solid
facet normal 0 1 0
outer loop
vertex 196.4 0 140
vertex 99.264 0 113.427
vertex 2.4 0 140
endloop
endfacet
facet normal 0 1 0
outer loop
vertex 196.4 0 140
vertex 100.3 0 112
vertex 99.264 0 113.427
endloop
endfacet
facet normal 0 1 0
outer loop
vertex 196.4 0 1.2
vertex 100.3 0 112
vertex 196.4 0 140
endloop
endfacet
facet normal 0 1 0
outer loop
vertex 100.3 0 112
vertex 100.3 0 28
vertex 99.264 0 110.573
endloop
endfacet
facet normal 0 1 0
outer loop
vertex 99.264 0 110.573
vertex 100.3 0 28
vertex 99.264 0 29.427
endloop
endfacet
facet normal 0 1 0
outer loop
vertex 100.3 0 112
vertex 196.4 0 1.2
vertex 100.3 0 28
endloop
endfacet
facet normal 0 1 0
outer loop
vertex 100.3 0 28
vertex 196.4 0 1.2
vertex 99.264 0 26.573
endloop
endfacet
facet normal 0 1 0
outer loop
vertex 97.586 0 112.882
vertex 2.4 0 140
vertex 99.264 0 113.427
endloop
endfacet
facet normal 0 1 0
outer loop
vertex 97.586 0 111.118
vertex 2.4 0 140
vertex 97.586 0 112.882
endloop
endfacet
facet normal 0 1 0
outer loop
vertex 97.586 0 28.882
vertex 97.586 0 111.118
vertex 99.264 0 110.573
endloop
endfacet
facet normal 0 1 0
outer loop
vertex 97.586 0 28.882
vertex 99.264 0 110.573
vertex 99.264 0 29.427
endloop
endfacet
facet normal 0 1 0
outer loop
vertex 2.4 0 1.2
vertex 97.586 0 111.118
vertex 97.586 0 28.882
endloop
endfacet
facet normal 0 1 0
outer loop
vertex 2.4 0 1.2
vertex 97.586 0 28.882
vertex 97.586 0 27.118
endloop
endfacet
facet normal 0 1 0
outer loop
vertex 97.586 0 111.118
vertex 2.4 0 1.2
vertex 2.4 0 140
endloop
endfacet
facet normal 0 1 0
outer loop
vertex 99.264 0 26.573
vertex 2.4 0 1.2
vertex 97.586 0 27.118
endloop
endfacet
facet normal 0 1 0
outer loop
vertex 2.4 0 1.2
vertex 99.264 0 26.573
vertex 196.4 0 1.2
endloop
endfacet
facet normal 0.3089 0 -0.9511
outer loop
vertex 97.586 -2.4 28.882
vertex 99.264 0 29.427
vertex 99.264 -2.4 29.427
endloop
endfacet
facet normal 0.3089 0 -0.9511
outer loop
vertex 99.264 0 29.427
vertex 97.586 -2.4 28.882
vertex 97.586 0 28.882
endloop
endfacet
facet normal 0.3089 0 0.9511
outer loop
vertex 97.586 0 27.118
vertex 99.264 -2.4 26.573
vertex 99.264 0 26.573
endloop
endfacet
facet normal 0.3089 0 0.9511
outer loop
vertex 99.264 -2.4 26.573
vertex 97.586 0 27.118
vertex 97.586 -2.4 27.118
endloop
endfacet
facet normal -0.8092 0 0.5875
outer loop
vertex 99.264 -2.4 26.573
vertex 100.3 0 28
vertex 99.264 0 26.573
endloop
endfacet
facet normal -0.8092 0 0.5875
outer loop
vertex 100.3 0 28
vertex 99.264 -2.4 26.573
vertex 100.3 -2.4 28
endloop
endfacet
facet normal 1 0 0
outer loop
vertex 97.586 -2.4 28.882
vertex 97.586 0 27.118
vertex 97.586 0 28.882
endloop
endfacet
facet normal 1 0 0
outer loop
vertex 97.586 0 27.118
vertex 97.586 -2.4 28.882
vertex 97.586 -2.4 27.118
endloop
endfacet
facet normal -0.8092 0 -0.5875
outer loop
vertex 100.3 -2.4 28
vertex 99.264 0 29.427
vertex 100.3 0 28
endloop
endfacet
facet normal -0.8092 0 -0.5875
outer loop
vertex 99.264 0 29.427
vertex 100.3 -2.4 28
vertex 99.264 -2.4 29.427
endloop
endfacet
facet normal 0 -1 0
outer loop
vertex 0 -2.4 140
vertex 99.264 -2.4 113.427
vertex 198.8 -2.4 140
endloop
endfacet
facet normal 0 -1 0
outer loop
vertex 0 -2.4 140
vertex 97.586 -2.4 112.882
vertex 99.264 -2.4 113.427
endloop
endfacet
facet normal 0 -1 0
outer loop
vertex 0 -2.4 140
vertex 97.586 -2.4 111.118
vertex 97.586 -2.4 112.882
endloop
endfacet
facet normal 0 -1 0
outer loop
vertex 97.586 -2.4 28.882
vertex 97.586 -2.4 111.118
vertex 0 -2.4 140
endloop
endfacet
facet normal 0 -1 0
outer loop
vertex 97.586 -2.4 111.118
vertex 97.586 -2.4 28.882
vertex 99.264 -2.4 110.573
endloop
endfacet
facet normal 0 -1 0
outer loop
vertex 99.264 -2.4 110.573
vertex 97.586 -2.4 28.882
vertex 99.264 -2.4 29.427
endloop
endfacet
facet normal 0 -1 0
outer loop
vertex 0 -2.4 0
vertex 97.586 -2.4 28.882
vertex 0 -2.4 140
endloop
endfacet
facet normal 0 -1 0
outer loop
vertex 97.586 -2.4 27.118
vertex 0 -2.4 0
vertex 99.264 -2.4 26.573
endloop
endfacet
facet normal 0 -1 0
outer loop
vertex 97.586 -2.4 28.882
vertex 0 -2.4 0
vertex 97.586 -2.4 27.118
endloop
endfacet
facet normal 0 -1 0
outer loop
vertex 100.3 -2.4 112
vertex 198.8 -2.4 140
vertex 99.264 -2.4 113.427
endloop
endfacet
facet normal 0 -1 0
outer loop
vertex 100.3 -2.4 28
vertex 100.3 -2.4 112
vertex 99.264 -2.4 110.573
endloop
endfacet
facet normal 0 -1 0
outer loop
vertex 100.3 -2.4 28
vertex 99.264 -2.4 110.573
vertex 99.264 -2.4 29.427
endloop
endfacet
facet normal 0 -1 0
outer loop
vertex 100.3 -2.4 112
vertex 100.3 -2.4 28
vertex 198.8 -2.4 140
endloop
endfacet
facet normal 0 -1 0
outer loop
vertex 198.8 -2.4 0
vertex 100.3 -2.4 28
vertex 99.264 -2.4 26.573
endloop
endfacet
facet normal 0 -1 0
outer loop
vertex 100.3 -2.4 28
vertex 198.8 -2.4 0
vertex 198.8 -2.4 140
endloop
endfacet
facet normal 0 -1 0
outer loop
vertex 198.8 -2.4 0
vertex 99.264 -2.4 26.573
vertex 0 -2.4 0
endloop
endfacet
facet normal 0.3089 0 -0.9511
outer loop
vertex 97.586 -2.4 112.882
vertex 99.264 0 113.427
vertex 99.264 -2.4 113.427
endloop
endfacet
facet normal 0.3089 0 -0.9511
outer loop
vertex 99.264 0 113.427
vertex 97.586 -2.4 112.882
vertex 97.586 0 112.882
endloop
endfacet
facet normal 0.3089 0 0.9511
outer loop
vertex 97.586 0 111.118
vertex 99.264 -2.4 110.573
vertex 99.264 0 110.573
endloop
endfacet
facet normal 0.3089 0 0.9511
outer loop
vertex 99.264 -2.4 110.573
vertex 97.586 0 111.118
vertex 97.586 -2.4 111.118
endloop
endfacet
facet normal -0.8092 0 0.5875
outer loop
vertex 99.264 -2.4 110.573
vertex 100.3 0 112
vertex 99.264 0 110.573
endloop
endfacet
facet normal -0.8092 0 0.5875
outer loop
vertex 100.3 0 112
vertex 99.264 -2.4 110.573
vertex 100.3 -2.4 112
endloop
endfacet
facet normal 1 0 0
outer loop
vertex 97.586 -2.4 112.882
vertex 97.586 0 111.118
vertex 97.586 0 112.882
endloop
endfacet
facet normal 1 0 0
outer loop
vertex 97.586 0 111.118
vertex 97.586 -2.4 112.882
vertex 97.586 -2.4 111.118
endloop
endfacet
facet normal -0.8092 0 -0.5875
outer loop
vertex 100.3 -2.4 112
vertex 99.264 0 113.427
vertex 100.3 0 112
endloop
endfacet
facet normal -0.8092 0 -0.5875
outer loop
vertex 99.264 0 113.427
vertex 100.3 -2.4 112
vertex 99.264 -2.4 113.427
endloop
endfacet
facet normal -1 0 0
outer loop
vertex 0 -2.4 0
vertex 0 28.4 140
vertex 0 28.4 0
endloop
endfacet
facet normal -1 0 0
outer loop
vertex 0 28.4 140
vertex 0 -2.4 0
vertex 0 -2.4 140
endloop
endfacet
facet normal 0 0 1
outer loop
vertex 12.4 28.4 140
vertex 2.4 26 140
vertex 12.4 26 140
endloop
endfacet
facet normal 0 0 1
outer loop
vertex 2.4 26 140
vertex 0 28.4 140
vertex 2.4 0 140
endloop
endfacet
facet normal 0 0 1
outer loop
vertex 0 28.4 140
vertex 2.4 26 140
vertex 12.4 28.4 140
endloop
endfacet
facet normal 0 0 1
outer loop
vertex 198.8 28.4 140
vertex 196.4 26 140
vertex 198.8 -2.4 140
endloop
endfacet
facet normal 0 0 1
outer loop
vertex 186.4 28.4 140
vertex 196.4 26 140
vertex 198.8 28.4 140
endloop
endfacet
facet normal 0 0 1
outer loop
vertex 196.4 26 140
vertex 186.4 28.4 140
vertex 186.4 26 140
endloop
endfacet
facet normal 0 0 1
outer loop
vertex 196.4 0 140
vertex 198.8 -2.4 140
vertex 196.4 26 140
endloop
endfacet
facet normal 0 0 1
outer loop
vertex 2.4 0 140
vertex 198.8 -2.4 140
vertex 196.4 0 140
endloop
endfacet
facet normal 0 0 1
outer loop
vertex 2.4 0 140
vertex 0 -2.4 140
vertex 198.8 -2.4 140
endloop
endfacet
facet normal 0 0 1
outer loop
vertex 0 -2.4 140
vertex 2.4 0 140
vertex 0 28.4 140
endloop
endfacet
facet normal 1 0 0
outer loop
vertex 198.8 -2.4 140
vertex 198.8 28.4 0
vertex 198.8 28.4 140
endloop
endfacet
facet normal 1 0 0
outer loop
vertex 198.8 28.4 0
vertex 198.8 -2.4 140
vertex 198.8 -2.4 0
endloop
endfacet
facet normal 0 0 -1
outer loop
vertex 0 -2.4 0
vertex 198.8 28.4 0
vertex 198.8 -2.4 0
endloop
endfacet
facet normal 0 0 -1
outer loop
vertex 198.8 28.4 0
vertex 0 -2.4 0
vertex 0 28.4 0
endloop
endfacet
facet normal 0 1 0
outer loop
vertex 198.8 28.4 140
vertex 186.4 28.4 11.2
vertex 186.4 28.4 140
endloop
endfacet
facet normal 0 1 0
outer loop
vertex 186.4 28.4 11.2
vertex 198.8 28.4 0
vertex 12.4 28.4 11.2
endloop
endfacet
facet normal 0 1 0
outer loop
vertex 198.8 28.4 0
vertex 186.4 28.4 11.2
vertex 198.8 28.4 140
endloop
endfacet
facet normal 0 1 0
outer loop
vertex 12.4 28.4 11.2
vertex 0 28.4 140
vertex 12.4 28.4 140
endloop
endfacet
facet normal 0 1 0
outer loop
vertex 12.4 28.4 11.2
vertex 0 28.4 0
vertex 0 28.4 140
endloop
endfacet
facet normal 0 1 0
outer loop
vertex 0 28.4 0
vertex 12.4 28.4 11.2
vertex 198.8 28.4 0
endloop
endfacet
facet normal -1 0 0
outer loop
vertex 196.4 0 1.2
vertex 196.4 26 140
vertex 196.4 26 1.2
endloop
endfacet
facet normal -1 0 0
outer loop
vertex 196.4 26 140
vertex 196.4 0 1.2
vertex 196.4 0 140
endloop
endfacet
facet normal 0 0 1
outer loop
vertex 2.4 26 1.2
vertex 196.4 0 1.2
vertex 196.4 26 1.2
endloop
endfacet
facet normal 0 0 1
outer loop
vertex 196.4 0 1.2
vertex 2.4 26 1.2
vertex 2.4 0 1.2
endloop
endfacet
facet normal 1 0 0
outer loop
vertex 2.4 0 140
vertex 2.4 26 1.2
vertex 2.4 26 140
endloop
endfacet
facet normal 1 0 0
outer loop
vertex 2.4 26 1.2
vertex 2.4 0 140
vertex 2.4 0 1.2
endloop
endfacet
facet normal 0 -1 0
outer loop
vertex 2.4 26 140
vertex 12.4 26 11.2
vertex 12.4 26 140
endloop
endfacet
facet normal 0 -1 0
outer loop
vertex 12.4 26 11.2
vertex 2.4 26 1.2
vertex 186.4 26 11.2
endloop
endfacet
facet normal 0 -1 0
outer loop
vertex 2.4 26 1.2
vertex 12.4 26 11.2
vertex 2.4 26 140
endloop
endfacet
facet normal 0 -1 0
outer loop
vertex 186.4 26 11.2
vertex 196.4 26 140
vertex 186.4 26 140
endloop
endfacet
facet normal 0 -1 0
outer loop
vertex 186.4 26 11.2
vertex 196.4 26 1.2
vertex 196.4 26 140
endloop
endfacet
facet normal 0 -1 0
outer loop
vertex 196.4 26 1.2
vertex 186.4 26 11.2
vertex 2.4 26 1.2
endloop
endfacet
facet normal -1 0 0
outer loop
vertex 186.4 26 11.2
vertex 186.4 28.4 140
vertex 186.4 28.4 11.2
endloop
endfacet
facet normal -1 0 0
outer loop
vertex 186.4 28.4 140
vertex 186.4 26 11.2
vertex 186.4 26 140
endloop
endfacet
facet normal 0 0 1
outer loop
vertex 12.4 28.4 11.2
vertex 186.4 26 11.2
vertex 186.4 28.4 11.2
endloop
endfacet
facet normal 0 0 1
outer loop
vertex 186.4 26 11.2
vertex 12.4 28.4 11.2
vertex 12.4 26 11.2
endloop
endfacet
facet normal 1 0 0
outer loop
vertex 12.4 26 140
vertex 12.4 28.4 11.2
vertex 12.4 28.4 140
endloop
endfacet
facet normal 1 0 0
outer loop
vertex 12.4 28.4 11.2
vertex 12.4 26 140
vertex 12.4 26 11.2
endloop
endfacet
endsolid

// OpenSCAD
z = 90;

//bathroom holder
boxes = [
    [21], // marker
    [32.5], // flonaise
    [10, 36], // comb
    [55, 30], // toothpaste
    [25], // toothbrush 
    [25], // toothbrush
];

//mice
boxes = [
    [93, 17], // keyboard thing
    [62, 40], // mouse
];
z = 60;

//remotes
boxes = [
    [40, 20], // fire TV
    [61, 25], // denon
    [57, 30], // projector
];
z = 70;

x=194;
y=26;

boxes = [
    [194,26],
];
z = 140;
edge = 10;


function my_sum(i, total=0) =
    i==0 ?
        total + boxes[0][0] :
        my_sum(i - 1, total + boxes[i][0]);

module all_shapes(move=0, grow=0) {
    for (n = [0:len(boxes)-1]) {
        if (boxes[n][1] == undef) {
            translate([my_sum(n)-boxes[n][0]/2+n*move+move,boxes[n][0]/2,0])
            cylinder(d=boxes[n][0]+grow*2, h=z);
        } else {
            translate([my_sum(n)-boxes[n][0]-grow+n*move+move,-grow,0])
            cube([boxes[n][0]+grow*2, boxes[n][1]+grow*2, boxes[n][2] != undef ? boxes[n][2] : z]);
        }
    }
}

wall=1.2;
screw=3;
head=10;
screw_offset=z/5;

module assembled() {
    difference() {
        hull()
        all_shapes(wall*2, wall*2);
        translate([0,0,wall])
        all_shapes(wall*2, 0);
        for (n = [screw_offset, z-screw_offset]) {
            translate([(my_sum(len(boxes)-1)+wall*2*len(boxes)+wall)/2,0,n])
            rotate([-90,0,0]) {
                cylinder(d=head,h=100);
                translate([0,0,-wall*2])
                cylinder(d=screw,h=100);
            }
        }
        translate([wall*2+edge,y/2,edge+wall])
        cube([x-edge*2,y,z]);
    }
}

module fine() {
    $fn=200;
    assembled();
}

display="";
if (display == "") assembled();
if (display == "bathroom_holder.stl") fine();
